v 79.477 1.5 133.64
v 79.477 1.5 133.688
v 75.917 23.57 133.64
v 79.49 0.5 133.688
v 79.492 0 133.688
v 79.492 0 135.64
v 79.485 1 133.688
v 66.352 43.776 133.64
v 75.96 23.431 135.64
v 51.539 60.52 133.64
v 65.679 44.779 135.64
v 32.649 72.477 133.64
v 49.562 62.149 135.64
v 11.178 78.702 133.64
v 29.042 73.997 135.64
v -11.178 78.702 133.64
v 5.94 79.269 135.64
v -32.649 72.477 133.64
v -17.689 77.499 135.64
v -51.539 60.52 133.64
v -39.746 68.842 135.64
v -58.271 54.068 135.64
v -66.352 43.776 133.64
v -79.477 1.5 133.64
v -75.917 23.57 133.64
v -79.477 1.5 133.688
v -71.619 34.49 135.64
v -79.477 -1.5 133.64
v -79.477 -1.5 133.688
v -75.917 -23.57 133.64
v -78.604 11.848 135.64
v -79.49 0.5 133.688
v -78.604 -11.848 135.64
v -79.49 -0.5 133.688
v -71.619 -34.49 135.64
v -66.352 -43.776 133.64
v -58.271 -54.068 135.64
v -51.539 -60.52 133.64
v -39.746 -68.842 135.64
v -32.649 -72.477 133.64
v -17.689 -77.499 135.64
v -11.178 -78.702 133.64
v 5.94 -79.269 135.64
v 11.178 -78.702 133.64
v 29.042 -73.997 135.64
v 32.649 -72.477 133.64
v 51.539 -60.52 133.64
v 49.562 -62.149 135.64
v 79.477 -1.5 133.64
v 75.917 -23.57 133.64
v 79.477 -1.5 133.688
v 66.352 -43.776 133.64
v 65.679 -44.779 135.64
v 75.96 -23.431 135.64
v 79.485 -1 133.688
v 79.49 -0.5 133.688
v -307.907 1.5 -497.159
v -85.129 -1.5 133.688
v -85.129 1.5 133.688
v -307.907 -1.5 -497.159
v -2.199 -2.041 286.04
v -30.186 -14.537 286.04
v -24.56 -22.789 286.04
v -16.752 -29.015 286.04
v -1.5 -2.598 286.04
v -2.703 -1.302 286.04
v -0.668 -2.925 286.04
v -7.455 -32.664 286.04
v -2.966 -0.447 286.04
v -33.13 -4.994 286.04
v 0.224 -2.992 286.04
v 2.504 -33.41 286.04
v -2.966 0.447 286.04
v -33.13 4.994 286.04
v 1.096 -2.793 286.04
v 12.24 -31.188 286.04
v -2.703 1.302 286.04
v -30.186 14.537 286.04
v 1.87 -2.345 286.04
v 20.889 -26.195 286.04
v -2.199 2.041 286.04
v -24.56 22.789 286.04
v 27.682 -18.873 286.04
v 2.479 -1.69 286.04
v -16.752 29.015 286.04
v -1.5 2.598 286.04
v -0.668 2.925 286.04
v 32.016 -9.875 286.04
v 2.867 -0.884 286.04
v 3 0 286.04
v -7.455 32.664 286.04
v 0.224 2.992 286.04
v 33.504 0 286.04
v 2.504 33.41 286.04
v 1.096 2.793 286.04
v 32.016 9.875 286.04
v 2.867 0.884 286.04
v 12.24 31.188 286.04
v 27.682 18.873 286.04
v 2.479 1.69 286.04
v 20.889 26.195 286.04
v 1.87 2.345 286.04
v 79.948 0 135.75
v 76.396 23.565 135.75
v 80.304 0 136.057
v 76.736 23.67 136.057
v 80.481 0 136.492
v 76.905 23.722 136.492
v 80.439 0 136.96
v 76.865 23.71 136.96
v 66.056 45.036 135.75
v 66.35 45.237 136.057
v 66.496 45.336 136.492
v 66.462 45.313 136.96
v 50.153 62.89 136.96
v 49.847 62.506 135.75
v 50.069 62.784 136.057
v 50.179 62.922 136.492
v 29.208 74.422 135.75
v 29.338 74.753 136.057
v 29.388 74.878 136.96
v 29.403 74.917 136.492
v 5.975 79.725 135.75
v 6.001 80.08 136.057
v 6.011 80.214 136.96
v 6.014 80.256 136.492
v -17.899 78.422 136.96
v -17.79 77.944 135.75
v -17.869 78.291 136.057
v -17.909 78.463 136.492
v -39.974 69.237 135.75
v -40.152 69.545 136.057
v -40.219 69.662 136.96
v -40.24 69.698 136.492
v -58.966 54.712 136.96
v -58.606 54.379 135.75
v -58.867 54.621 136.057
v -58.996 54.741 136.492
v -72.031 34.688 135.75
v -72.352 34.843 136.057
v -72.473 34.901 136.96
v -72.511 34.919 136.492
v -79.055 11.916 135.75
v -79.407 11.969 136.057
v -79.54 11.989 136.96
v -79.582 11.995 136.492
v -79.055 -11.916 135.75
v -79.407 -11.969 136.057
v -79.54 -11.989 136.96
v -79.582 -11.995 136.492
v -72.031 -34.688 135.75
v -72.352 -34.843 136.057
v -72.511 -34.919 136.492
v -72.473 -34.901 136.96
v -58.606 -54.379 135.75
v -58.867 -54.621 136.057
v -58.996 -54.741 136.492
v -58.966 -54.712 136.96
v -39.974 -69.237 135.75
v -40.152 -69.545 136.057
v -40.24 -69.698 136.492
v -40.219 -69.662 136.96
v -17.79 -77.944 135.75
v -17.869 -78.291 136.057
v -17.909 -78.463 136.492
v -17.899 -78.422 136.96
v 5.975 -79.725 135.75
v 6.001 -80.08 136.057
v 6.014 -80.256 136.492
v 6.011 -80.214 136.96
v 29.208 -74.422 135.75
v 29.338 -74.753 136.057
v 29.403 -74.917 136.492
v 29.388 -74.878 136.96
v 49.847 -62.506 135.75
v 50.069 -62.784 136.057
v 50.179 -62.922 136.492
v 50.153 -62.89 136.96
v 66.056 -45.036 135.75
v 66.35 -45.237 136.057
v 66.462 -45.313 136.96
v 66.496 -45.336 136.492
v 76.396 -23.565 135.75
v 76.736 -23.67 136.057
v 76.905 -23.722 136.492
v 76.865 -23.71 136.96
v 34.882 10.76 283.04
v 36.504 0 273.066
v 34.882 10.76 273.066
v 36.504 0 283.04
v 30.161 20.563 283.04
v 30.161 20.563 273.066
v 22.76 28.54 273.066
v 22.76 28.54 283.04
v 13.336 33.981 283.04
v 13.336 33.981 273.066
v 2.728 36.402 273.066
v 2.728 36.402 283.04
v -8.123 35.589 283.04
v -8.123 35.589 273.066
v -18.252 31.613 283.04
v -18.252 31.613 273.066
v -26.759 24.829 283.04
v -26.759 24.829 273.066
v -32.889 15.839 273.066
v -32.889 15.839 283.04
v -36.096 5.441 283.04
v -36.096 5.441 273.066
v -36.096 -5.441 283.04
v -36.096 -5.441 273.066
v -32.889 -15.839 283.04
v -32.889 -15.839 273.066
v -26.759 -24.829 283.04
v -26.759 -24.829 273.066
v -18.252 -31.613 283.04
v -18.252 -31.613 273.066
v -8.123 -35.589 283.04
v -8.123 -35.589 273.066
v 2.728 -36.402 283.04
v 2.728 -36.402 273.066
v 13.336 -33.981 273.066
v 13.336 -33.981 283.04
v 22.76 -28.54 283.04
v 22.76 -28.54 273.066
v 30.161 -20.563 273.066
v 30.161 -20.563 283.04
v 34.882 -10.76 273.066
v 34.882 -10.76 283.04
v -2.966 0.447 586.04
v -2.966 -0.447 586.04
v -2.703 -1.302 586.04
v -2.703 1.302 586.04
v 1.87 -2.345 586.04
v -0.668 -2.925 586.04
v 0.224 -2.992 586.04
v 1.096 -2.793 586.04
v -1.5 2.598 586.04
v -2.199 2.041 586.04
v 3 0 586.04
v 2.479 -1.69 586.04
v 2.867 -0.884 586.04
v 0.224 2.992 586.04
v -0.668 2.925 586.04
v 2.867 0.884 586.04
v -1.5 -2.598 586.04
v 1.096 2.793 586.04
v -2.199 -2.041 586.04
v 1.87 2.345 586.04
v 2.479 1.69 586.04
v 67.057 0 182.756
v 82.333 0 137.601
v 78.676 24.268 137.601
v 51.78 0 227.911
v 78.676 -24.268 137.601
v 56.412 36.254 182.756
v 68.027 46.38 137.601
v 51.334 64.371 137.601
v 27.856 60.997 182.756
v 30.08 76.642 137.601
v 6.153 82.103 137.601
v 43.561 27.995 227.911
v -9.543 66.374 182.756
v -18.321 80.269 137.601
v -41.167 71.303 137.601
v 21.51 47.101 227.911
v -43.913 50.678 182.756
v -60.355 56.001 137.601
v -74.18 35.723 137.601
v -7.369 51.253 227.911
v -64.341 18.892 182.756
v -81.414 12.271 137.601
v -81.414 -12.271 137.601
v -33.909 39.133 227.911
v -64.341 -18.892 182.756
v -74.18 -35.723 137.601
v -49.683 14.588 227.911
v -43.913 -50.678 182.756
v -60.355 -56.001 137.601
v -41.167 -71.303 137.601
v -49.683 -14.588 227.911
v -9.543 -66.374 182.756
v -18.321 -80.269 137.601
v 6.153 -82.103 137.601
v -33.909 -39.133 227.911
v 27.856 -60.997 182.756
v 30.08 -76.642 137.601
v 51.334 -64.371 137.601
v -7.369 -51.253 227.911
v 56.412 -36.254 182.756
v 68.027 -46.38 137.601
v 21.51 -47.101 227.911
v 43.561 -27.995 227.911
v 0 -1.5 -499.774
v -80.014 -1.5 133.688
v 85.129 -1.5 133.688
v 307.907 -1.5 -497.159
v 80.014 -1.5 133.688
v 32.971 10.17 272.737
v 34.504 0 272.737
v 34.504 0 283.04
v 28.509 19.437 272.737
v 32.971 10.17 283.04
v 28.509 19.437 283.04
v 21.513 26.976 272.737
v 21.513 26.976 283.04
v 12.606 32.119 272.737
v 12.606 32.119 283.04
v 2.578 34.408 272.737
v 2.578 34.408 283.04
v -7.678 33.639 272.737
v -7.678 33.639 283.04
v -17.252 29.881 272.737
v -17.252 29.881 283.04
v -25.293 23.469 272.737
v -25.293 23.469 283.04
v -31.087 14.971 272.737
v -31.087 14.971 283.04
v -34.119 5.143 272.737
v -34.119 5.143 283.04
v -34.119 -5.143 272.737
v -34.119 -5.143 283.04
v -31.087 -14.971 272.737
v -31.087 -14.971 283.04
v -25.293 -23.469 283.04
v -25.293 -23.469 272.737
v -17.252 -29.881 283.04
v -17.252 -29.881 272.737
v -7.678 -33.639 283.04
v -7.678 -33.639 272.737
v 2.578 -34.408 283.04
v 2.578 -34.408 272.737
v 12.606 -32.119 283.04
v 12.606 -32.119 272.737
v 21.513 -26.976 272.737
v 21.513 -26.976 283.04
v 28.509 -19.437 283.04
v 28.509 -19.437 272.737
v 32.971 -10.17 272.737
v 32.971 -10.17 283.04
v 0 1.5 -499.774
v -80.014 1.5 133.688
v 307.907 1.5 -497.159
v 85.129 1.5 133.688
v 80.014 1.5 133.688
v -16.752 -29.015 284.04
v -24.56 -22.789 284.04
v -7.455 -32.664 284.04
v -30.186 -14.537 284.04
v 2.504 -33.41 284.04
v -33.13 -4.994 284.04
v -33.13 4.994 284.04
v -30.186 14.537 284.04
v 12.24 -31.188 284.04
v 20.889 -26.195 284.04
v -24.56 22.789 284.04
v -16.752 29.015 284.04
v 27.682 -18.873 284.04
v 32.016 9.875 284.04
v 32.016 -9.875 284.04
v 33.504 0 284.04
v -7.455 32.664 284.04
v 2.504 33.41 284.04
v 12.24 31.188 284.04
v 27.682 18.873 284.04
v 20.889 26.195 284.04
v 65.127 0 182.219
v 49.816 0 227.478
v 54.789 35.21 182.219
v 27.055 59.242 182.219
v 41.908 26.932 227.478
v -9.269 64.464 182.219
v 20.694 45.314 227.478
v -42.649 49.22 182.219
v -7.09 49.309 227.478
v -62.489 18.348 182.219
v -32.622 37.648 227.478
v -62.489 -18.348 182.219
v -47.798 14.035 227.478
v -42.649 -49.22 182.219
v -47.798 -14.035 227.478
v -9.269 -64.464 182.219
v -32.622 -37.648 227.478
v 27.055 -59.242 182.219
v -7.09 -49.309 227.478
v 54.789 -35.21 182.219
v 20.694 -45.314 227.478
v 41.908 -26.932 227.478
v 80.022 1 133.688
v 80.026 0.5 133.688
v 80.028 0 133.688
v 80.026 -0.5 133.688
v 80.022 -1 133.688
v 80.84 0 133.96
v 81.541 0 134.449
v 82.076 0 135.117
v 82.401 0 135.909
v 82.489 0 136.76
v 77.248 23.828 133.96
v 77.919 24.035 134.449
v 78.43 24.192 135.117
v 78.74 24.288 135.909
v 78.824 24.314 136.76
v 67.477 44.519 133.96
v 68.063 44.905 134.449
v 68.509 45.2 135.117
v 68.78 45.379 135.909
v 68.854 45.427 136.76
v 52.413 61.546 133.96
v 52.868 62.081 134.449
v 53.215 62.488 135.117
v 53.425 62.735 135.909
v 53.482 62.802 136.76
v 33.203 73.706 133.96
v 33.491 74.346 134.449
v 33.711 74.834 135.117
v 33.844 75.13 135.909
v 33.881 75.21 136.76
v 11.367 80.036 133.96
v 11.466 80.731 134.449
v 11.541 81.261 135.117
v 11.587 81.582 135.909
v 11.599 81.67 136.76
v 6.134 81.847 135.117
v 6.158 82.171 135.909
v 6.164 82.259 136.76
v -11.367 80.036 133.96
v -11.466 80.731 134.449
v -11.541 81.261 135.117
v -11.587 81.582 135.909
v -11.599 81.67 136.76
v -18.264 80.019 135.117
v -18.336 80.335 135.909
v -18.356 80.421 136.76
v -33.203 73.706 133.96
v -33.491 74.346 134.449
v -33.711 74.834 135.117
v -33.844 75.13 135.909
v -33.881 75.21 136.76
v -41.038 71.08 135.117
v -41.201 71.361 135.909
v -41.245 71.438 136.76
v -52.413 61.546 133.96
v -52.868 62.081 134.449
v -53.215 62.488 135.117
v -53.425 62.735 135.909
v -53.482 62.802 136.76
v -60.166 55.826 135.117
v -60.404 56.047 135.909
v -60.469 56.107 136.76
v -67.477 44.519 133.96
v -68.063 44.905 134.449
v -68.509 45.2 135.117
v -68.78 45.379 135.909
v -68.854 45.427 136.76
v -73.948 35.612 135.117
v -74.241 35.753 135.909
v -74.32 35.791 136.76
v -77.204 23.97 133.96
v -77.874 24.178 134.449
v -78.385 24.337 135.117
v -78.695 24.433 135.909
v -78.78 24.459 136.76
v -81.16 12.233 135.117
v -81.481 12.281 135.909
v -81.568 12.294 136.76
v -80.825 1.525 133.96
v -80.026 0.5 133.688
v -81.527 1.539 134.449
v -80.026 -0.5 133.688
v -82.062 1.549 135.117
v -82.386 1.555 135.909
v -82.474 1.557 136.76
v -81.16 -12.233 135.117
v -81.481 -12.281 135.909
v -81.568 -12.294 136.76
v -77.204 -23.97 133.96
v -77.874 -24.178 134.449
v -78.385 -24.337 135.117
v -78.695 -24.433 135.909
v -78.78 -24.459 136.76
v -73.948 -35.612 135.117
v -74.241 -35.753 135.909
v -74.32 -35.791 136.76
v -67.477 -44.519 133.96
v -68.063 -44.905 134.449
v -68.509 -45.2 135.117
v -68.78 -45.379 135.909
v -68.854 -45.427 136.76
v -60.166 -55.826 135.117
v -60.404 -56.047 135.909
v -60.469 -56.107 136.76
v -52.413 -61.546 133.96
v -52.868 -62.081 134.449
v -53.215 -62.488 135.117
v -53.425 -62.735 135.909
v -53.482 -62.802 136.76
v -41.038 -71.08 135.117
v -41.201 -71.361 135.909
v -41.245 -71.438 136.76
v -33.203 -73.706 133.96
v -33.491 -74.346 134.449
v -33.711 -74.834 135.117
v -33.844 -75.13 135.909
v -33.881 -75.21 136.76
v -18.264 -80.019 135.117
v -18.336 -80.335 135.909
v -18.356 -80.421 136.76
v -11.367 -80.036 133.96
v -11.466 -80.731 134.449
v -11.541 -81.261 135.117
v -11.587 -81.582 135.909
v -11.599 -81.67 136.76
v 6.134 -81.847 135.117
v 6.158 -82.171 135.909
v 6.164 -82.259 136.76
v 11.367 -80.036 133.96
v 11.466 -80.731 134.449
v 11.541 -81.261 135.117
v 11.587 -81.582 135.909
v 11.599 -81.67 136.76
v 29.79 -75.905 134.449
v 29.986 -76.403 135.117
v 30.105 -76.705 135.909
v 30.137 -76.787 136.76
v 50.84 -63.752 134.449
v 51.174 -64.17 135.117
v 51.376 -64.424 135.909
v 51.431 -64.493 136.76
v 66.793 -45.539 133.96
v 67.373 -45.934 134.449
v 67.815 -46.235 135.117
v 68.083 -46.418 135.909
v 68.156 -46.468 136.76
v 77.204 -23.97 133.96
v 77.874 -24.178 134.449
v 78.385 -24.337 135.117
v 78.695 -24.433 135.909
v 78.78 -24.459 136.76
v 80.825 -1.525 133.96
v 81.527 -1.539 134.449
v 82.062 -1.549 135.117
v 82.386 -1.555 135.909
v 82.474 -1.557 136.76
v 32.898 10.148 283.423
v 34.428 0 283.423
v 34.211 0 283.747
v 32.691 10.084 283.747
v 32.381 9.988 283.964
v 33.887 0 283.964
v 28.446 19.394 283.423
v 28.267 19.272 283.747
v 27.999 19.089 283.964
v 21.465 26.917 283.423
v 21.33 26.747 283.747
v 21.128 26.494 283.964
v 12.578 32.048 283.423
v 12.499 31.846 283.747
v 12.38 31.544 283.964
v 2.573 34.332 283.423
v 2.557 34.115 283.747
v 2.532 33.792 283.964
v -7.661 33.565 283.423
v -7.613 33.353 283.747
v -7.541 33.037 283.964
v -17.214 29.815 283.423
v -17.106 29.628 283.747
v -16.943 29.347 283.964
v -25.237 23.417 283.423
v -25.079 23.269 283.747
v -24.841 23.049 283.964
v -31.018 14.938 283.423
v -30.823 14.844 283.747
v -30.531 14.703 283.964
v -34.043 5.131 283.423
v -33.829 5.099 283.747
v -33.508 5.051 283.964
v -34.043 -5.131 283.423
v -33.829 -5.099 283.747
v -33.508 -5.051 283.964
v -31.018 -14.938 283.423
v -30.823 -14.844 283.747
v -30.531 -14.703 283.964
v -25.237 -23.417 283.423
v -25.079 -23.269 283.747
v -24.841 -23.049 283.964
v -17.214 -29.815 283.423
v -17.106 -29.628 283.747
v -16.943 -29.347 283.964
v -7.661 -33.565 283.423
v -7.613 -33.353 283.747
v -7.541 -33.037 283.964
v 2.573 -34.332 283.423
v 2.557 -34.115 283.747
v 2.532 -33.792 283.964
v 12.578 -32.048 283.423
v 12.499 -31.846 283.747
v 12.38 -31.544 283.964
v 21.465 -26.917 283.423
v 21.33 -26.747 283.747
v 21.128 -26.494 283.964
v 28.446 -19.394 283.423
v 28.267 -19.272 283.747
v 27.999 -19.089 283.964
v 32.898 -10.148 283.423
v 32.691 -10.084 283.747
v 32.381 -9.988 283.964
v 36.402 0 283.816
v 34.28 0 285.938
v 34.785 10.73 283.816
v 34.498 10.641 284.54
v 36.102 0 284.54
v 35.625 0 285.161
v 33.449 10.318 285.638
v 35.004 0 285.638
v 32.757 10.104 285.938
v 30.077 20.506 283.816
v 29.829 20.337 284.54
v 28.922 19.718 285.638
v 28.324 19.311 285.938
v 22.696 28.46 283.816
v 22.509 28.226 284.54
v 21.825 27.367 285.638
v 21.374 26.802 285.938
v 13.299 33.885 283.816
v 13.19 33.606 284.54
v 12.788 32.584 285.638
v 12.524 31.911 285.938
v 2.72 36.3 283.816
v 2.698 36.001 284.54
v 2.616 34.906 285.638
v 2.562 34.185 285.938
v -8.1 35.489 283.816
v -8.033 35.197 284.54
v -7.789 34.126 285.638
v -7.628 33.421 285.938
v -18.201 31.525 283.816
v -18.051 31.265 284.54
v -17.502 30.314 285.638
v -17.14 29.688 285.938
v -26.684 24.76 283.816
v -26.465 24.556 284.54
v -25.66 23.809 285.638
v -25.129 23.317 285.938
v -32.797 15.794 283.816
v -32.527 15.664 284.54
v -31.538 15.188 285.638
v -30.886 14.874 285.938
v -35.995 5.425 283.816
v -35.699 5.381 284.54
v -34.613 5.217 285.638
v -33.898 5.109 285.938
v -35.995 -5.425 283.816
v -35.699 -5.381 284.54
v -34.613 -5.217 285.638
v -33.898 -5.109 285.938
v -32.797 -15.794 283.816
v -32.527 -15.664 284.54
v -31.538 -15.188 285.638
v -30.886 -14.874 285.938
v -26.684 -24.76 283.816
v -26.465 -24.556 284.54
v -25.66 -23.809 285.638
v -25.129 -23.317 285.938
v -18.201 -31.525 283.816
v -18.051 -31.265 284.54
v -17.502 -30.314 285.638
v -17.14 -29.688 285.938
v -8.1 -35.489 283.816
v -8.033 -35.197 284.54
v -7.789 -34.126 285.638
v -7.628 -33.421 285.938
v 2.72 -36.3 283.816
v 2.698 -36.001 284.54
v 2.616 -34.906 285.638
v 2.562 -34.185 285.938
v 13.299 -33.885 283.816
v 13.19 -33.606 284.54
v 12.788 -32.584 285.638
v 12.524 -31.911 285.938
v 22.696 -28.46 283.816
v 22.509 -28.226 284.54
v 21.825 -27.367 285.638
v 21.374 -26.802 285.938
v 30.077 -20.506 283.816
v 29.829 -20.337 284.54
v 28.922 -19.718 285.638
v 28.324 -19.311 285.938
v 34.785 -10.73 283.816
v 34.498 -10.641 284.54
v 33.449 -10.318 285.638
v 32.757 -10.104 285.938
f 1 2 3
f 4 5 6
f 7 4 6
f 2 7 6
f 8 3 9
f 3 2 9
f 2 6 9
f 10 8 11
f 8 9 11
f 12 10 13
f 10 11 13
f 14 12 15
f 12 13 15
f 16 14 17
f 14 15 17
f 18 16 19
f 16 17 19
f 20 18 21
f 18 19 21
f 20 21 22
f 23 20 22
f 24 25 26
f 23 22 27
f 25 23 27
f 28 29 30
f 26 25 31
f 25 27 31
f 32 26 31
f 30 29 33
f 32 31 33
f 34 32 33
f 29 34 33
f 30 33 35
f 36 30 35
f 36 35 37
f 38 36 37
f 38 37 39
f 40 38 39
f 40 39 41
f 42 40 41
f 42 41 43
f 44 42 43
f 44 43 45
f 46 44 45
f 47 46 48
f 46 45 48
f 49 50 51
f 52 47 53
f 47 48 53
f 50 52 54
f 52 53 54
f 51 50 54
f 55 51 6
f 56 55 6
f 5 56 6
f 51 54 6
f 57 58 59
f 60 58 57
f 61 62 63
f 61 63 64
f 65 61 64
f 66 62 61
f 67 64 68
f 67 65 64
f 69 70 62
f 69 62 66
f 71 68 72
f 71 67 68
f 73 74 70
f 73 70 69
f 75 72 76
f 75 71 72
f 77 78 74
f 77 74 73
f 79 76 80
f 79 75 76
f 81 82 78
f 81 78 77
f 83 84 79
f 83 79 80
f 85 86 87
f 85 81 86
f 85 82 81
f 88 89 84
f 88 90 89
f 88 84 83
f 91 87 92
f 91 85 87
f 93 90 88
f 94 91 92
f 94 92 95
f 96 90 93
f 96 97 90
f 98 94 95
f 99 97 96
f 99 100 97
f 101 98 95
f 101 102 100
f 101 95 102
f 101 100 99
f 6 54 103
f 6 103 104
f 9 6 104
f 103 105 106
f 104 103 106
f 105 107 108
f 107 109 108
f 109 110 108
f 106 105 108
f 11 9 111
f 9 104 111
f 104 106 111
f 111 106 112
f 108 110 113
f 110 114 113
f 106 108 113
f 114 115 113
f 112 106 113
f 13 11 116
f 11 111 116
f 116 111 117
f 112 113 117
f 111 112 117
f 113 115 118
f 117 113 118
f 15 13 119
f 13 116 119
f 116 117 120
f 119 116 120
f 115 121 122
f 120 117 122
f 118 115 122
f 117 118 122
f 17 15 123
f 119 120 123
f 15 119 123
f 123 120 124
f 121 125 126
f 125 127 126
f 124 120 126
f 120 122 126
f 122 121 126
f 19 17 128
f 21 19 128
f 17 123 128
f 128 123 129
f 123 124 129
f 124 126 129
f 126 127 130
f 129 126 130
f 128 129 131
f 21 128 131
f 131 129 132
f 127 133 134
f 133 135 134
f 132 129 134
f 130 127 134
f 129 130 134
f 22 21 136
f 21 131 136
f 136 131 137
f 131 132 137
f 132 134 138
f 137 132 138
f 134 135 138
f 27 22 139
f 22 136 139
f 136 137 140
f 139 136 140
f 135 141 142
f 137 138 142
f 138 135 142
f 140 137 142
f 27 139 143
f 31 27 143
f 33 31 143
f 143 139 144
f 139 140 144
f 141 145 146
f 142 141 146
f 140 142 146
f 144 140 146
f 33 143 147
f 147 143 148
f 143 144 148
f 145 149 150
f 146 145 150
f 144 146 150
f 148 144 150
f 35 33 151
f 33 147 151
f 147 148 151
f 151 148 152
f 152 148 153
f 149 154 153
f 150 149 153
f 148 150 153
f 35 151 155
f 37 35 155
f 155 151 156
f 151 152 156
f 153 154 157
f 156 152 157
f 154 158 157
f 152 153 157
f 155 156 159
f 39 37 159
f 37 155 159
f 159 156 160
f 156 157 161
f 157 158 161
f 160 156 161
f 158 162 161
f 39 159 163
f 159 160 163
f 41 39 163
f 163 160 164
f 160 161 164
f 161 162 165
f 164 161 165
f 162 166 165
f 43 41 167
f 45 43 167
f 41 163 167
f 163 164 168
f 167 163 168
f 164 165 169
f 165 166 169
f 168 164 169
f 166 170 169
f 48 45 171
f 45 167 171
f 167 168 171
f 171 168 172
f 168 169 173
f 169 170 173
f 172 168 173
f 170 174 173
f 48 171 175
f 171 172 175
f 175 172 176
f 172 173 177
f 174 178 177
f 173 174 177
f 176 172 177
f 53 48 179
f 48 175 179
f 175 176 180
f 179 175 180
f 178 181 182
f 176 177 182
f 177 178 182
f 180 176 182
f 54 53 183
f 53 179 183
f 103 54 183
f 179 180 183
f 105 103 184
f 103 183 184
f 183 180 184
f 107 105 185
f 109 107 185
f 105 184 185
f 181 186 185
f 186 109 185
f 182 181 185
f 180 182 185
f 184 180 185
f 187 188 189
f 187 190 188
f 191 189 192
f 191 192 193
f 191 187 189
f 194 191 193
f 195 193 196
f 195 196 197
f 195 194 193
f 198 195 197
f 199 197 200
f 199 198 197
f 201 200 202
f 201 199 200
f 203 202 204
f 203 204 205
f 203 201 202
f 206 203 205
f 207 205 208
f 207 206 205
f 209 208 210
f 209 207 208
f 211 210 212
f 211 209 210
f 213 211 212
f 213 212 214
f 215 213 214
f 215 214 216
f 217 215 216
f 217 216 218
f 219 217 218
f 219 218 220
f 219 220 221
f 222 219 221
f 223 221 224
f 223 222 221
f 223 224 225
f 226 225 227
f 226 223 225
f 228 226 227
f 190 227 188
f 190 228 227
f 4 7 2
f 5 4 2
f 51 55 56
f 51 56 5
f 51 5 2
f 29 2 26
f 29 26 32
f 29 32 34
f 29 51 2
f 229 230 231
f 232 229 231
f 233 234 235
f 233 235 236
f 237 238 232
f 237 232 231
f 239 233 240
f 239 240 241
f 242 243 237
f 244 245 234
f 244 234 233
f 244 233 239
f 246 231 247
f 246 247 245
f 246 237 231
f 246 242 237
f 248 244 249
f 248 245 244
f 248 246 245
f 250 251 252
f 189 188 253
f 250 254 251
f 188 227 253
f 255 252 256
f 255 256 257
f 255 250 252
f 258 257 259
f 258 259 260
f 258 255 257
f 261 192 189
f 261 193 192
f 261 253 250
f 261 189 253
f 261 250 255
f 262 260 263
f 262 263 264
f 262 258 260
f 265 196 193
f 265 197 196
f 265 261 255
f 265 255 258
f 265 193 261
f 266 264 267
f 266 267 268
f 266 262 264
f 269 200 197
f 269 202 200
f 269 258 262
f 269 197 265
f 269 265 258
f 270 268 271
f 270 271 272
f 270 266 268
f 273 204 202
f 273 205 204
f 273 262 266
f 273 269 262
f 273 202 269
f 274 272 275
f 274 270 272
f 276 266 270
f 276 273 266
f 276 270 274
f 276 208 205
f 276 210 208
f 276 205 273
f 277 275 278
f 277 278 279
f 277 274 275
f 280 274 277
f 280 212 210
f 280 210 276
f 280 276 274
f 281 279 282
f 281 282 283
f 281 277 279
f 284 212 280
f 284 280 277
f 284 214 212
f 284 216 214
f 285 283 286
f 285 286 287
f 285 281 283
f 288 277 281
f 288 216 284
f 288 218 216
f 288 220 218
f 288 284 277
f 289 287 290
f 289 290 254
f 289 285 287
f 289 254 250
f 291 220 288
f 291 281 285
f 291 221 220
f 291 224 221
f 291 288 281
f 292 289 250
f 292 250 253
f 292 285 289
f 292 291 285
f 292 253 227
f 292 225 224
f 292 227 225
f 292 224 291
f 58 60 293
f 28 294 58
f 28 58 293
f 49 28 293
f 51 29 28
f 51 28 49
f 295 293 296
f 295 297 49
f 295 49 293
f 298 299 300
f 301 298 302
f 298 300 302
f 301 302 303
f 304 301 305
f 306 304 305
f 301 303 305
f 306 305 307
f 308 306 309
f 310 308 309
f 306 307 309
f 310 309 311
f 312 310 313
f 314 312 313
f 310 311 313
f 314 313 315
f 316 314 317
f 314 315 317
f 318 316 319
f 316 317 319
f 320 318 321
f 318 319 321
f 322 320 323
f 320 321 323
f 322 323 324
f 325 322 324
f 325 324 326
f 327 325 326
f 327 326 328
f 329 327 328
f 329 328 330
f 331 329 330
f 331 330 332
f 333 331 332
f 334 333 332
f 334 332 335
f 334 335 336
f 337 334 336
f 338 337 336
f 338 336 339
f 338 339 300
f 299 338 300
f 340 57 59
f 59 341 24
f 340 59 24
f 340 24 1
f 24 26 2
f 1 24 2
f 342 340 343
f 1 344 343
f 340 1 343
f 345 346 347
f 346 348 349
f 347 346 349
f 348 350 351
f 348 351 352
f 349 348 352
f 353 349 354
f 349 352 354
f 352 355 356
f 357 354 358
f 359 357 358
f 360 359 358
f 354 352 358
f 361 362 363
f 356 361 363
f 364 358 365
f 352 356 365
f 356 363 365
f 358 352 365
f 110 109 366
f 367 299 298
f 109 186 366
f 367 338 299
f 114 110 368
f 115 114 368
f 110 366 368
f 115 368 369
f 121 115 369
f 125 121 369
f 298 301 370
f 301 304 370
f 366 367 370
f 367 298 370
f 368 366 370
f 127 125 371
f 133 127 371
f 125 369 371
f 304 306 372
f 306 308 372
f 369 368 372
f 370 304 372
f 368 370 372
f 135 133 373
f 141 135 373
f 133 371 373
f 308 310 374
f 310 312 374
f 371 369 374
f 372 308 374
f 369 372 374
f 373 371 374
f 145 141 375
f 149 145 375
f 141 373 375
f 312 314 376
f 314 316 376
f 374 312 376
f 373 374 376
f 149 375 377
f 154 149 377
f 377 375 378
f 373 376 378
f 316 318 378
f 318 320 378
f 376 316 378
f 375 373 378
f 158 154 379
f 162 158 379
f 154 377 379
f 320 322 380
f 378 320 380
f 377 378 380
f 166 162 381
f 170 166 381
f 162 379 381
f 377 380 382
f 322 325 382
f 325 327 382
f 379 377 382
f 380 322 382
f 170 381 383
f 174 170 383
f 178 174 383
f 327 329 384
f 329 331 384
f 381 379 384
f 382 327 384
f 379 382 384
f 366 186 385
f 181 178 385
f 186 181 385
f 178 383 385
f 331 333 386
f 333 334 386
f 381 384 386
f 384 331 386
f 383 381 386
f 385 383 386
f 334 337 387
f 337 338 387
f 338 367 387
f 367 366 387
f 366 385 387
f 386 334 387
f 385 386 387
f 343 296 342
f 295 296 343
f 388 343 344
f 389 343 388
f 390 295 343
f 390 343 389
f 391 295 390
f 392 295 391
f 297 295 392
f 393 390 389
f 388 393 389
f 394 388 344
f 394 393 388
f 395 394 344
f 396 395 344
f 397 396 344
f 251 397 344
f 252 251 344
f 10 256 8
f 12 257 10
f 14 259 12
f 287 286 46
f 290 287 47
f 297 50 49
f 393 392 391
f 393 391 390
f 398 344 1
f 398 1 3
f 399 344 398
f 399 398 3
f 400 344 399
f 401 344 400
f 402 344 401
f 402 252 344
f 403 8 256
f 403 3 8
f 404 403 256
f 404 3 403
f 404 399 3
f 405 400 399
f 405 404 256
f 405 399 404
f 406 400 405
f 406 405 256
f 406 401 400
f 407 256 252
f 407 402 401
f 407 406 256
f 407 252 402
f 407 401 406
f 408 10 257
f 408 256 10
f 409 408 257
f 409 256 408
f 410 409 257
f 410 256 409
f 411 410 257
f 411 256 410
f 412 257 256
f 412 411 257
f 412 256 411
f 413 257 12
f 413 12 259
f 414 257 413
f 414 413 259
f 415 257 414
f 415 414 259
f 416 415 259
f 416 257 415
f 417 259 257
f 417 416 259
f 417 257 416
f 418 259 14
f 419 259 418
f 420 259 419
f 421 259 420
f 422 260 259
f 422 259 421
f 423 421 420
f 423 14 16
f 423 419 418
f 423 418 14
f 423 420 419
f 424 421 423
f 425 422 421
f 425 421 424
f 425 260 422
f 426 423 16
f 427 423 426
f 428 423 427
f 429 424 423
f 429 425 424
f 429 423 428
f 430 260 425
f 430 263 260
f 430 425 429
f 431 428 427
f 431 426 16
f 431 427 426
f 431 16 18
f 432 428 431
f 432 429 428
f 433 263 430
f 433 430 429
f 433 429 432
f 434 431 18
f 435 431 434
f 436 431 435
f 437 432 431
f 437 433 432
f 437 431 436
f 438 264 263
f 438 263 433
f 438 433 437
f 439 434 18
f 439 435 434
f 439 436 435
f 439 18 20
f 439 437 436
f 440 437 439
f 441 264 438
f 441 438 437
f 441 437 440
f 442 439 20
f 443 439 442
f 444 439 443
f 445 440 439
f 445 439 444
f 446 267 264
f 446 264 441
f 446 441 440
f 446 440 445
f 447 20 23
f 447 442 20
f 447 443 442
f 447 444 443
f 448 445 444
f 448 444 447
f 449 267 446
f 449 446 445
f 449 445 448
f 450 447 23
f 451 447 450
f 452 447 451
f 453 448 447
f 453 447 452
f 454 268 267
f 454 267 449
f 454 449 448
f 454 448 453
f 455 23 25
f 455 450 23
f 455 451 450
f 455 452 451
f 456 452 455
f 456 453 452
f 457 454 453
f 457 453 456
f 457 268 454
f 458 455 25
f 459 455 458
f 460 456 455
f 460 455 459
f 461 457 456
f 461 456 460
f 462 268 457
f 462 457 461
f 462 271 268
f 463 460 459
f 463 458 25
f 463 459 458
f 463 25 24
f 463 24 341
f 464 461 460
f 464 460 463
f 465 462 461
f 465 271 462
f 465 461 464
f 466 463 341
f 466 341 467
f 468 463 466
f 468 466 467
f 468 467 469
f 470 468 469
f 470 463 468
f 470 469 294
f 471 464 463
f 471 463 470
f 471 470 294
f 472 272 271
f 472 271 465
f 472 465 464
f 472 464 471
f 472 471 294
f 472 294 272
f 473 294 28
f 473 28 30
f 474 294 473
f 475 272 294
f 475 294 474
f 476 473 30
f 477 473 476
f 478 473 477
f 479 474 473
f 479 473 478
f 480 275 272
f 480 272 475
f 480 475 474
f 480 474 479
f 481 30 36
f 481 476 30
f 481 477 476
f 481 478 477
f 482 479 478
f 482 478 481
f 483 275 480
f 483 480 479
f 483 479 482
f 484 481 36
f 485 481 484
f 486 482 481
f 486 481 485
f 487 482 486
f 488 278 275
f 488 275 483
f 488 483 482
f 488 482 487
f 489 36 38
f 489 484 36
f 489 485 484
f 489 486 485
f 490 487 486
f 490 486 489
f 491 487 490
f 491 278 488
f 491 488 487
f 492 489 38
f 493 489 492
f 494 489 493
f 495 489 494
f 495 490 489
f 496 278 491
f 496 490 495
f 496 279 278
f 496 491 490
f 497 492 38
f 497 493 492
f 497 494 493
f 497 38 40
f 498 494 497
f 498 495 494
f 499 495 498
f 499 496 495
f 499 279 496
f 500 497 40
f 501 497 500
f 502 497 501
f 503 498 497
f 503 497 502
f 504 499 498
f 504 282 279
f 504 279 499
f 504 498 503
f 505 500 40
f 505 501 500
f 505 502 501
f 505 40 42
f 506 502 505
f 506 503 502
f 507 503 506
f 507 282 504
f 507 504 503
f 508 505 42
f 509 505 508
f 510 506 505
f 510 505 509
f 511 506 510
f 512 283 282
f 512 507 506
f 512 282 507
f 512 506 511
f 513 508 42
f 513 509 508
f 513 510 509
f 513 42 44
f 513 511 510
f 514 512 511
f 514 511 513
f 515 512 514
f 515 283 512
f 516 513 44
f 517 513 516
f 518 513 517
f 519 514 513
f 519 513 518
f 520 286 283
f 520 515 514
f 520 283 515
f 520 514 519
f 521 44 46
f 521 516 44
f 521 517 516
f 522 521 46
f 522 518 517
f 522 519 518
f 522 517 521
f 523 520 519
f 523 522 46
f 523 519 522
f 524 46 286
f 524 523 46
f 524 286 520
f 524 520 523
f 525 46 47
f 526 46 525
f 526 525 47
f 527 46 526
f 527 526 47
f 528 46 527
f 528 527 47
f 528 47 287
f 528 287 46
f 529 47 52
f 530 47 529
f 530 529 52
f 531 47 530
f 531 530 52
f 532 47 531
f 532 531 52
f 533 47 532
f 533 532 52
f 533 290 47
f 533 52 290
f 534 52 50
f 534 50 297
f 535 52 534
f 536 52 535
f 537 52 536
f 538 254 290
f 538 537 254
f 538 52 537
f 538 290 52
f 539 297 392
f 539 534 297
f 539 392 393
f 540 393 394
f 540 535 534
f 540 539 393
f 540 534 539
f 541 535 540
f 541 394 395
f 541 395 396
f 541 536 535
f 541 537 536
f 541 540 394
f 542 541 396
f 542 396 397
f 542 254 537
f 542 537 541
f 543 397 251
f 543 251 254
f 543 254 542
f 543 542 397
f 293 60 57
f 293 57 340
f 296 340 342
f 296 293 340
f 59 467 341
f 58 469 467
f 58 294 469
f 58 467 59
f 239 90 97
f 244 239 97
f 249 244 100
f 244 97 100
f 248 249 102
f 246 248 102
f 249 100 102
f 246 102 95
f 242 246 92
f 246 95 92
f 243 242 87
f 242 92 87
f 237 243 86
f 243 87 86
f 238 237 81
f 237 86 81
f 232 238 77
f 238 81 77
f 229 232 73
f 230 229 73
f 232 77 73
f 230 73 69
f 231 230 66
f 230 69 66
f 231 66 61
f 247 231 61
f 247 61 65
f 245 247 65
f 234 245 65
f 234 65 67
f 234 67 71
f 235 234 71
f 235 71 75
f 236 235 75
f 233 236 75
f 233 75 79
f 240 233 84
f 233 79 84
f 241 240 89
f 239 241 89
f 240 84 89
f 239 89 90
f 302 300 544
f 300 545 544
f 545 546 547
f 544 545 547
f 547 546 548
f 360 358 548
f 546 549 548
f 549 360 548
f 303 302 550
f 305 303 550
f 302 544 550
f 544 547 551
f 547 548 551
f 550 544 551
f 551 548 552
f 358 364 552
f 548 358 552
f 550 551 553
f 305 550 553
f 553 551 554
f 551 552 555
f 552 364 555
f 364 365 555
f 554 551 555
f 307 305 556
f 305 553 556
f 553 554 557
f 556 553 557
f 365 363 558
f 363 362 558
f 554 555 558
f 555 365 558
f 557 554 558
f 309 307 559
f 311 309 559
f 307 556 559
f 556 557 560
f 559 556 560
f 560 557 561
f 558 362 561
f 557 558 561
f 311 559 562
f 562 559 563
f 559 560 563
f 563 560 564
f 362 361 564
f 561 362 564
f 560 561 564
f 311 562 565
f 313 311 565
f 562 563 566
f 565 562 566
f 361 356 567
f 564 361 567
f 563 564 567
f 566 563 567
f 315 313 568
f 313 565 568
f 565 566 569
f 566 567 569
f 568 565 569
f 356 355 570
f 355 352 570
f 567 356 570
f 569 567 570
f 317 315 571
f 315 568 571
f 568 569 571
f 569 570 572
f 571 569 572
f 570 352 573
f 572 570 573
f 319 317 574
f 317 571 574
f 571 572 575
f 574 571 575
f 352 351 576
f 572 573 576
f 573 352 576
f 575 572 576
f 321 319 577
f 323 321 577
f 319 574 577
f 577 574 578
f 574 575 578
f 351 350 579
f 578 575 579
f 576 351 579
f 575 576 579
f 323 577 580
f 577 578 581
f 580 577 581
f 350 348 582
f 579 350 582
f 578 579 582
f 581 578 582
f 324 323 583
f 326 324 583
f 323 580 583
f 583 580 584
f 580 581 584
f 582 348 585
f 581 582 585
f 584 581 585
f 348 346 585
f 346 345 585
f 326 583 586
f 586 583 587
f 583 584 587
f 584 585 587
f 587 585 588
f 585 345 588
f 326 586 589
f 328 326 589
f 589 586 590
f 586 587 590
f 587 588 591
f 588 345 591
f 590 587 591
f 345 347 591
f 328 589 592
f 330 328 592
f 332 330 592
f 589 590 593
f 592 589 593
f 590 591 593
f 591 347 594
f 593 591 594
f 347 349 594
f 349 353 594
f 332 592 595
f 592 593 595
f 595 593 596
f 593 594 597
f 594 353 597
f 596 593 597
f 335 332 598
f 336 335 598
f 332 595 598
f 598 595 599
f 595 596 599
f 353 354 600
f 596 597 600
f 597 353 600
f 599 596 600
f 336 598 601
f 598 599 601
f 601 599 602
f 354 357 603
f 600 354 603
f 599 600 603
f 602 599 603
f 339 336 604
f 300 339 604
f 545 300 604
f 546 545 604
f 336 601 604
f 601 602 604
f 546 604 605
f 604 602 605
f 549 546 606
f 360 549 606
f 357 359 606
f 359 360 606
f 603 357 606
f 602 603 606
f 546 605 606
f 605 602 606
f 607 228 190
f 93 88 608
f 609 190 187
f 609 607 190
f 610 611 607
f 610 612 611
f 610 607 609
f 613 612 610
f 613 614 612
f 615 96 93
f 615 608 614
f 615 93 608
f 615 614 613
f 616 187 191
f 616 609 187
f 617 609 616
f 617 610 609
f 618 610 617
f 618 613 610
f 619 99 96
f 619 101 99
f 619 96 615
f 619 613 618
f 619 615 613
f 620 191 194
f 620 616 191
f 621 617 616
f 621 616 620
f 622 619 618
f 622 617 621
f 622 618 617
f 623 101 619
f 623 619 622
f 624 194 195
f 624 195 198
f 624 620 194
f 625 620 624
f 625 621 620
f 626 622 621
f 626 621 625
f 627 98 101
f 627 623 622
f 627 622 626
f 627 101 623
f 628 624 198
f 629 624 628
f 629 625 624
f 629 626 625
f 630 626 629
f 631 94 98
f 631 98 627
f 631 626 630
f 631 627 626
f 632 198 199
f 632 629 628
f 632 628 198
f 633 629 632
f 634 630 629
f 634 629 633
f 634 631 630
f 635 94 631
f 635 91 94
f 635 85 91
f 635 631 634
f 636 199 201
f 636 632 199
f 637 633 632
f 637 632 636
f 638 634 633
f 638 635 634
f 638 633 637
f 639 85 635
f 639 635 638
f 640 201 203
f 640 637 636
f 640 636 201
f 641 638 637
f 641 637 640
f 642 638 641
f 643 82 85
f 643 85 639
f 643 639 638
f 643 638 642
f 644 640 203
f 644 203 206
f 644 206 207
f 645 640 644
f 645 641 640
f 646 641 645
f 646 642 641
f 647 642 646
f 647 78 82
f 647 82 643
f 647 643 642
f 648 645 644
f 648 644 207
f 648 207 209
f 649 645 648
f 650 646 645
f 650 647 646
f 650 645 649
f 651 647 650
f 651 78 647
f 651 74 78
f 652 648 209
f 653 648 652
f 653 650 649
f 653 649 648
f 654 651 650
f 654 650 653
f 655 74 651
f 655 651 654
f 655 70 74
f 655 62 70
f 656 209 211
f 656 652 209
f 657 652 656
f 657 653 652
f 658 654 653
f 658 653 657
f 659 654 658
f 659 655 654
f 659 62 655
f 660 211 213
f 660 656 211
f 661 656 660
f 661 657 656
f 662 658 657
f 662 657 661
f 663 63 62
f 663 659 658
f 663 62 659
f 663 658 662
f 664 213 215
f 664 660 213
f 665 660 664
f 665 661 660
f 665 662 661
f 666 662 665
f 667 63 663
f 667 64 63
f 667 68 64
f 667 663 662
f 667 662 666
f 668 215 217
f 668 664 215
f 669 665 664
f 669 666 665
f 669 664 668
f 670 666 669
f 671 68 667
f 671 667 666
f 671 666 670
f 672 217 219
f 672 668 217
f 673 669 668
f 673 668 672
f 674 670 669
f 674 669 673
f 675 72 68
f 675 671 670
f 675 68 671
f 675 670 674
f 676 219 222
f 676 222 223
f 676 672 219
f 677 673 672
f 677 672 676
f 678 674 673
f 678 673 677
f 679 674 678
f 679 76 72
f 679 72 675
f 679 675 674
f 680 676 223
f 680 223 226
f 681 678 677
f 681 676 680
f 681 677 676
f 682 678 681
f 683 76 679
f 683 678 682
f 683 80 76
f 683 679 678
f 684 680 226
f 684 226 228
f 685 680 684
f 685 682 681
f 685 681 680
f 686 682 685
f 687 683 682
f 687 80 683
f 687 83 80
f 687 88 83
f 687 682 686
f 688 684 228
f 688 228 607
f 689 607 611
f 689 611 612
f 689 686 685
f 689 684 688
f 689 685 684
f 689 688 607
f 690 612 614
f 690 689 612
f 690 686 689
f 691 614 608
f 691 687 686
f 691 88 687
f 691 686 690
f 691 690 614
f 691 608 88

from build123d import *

# Parameters (mm, degrees)
F2_T     = -2
F3_R     = 3
F4_DEPTH = 300
F6_DEPTH = 1.5


# Not quite as in the source:
# - a shell that OpenCascade refuses in one call is made with other operations: the cavity is built on its own and cut out


with BuildPart() as f1:
    # F0 (on Front) → F1 (revolve)
    with BuildSketch(Plane.XZ):
        with BuildLine():
            Line((33.5040265024, 286.039857173), (0, 286.039857173))
            Line((0, 286.039857173), (0, 133.639857173))
            Line((0, 133.639857173), (79.491585897, 133.639857173))
            ThreePointArc((79.491585897, 133.639857173), (81.9292301706, 134.8911746988), (82.33336311, 137.6012635761))
            Line((82.33336311, 137.6012635761), (36.5040265024, 273.0661034584))
            Line((36.5040265024, 273.0661034584), (36.5040265024, 283.039857173))
            ThreePointArc((36.5040265024, 283.039857173), (35.6253468459, 285.1611775165), (33.5040265024, 286.039857173))
        make_face()
    revolve(axis=Axis((0, 0, 248.212441802), (0, 0, 1)))

    # F2: a shell. OpenCascade refuses it in one call, so the cavity is built on its own and cut out:
    # the body offset inwards by the wall thickness, plus a prism from it out through each open face.
    f2_core = offset(f1.part, amount=F2_T, kind=Kind.INTERSECTION, mode=Mode.PRIVATE)
    f2_exits = [f2_core.faces().sort_by_distance(p)[0] for p in [
        (0, 0, 135.639857),
    ]]
    add(f2_core, mode=Mode.SUBTRACT)
    extrude(f2_exits, amount=-F2_T, mode=Mode.SUBTRACT)

    # F3 (on face) → F4 (join)
    with BuildSketch(Plane.XY.offset(286.039857173)):
        Circle(F3_R)
    extrude(amount=F4_DEPTH)

    # F5 (on Front) → F6 (join, symmetric)
    with BuildSketch(Plane.XZ):
        Polygon((85.1287149498, 133.688211441), (0, 133.688211441), (-85.1287149498, 133.688211441), (-307.906627655, -497.1588850021), (0, -499.7738599777), (307.906627655, -497.1588850021), align=None)
    extrude(amount=F6_DEPTH, both=True)


solid = f1.part
